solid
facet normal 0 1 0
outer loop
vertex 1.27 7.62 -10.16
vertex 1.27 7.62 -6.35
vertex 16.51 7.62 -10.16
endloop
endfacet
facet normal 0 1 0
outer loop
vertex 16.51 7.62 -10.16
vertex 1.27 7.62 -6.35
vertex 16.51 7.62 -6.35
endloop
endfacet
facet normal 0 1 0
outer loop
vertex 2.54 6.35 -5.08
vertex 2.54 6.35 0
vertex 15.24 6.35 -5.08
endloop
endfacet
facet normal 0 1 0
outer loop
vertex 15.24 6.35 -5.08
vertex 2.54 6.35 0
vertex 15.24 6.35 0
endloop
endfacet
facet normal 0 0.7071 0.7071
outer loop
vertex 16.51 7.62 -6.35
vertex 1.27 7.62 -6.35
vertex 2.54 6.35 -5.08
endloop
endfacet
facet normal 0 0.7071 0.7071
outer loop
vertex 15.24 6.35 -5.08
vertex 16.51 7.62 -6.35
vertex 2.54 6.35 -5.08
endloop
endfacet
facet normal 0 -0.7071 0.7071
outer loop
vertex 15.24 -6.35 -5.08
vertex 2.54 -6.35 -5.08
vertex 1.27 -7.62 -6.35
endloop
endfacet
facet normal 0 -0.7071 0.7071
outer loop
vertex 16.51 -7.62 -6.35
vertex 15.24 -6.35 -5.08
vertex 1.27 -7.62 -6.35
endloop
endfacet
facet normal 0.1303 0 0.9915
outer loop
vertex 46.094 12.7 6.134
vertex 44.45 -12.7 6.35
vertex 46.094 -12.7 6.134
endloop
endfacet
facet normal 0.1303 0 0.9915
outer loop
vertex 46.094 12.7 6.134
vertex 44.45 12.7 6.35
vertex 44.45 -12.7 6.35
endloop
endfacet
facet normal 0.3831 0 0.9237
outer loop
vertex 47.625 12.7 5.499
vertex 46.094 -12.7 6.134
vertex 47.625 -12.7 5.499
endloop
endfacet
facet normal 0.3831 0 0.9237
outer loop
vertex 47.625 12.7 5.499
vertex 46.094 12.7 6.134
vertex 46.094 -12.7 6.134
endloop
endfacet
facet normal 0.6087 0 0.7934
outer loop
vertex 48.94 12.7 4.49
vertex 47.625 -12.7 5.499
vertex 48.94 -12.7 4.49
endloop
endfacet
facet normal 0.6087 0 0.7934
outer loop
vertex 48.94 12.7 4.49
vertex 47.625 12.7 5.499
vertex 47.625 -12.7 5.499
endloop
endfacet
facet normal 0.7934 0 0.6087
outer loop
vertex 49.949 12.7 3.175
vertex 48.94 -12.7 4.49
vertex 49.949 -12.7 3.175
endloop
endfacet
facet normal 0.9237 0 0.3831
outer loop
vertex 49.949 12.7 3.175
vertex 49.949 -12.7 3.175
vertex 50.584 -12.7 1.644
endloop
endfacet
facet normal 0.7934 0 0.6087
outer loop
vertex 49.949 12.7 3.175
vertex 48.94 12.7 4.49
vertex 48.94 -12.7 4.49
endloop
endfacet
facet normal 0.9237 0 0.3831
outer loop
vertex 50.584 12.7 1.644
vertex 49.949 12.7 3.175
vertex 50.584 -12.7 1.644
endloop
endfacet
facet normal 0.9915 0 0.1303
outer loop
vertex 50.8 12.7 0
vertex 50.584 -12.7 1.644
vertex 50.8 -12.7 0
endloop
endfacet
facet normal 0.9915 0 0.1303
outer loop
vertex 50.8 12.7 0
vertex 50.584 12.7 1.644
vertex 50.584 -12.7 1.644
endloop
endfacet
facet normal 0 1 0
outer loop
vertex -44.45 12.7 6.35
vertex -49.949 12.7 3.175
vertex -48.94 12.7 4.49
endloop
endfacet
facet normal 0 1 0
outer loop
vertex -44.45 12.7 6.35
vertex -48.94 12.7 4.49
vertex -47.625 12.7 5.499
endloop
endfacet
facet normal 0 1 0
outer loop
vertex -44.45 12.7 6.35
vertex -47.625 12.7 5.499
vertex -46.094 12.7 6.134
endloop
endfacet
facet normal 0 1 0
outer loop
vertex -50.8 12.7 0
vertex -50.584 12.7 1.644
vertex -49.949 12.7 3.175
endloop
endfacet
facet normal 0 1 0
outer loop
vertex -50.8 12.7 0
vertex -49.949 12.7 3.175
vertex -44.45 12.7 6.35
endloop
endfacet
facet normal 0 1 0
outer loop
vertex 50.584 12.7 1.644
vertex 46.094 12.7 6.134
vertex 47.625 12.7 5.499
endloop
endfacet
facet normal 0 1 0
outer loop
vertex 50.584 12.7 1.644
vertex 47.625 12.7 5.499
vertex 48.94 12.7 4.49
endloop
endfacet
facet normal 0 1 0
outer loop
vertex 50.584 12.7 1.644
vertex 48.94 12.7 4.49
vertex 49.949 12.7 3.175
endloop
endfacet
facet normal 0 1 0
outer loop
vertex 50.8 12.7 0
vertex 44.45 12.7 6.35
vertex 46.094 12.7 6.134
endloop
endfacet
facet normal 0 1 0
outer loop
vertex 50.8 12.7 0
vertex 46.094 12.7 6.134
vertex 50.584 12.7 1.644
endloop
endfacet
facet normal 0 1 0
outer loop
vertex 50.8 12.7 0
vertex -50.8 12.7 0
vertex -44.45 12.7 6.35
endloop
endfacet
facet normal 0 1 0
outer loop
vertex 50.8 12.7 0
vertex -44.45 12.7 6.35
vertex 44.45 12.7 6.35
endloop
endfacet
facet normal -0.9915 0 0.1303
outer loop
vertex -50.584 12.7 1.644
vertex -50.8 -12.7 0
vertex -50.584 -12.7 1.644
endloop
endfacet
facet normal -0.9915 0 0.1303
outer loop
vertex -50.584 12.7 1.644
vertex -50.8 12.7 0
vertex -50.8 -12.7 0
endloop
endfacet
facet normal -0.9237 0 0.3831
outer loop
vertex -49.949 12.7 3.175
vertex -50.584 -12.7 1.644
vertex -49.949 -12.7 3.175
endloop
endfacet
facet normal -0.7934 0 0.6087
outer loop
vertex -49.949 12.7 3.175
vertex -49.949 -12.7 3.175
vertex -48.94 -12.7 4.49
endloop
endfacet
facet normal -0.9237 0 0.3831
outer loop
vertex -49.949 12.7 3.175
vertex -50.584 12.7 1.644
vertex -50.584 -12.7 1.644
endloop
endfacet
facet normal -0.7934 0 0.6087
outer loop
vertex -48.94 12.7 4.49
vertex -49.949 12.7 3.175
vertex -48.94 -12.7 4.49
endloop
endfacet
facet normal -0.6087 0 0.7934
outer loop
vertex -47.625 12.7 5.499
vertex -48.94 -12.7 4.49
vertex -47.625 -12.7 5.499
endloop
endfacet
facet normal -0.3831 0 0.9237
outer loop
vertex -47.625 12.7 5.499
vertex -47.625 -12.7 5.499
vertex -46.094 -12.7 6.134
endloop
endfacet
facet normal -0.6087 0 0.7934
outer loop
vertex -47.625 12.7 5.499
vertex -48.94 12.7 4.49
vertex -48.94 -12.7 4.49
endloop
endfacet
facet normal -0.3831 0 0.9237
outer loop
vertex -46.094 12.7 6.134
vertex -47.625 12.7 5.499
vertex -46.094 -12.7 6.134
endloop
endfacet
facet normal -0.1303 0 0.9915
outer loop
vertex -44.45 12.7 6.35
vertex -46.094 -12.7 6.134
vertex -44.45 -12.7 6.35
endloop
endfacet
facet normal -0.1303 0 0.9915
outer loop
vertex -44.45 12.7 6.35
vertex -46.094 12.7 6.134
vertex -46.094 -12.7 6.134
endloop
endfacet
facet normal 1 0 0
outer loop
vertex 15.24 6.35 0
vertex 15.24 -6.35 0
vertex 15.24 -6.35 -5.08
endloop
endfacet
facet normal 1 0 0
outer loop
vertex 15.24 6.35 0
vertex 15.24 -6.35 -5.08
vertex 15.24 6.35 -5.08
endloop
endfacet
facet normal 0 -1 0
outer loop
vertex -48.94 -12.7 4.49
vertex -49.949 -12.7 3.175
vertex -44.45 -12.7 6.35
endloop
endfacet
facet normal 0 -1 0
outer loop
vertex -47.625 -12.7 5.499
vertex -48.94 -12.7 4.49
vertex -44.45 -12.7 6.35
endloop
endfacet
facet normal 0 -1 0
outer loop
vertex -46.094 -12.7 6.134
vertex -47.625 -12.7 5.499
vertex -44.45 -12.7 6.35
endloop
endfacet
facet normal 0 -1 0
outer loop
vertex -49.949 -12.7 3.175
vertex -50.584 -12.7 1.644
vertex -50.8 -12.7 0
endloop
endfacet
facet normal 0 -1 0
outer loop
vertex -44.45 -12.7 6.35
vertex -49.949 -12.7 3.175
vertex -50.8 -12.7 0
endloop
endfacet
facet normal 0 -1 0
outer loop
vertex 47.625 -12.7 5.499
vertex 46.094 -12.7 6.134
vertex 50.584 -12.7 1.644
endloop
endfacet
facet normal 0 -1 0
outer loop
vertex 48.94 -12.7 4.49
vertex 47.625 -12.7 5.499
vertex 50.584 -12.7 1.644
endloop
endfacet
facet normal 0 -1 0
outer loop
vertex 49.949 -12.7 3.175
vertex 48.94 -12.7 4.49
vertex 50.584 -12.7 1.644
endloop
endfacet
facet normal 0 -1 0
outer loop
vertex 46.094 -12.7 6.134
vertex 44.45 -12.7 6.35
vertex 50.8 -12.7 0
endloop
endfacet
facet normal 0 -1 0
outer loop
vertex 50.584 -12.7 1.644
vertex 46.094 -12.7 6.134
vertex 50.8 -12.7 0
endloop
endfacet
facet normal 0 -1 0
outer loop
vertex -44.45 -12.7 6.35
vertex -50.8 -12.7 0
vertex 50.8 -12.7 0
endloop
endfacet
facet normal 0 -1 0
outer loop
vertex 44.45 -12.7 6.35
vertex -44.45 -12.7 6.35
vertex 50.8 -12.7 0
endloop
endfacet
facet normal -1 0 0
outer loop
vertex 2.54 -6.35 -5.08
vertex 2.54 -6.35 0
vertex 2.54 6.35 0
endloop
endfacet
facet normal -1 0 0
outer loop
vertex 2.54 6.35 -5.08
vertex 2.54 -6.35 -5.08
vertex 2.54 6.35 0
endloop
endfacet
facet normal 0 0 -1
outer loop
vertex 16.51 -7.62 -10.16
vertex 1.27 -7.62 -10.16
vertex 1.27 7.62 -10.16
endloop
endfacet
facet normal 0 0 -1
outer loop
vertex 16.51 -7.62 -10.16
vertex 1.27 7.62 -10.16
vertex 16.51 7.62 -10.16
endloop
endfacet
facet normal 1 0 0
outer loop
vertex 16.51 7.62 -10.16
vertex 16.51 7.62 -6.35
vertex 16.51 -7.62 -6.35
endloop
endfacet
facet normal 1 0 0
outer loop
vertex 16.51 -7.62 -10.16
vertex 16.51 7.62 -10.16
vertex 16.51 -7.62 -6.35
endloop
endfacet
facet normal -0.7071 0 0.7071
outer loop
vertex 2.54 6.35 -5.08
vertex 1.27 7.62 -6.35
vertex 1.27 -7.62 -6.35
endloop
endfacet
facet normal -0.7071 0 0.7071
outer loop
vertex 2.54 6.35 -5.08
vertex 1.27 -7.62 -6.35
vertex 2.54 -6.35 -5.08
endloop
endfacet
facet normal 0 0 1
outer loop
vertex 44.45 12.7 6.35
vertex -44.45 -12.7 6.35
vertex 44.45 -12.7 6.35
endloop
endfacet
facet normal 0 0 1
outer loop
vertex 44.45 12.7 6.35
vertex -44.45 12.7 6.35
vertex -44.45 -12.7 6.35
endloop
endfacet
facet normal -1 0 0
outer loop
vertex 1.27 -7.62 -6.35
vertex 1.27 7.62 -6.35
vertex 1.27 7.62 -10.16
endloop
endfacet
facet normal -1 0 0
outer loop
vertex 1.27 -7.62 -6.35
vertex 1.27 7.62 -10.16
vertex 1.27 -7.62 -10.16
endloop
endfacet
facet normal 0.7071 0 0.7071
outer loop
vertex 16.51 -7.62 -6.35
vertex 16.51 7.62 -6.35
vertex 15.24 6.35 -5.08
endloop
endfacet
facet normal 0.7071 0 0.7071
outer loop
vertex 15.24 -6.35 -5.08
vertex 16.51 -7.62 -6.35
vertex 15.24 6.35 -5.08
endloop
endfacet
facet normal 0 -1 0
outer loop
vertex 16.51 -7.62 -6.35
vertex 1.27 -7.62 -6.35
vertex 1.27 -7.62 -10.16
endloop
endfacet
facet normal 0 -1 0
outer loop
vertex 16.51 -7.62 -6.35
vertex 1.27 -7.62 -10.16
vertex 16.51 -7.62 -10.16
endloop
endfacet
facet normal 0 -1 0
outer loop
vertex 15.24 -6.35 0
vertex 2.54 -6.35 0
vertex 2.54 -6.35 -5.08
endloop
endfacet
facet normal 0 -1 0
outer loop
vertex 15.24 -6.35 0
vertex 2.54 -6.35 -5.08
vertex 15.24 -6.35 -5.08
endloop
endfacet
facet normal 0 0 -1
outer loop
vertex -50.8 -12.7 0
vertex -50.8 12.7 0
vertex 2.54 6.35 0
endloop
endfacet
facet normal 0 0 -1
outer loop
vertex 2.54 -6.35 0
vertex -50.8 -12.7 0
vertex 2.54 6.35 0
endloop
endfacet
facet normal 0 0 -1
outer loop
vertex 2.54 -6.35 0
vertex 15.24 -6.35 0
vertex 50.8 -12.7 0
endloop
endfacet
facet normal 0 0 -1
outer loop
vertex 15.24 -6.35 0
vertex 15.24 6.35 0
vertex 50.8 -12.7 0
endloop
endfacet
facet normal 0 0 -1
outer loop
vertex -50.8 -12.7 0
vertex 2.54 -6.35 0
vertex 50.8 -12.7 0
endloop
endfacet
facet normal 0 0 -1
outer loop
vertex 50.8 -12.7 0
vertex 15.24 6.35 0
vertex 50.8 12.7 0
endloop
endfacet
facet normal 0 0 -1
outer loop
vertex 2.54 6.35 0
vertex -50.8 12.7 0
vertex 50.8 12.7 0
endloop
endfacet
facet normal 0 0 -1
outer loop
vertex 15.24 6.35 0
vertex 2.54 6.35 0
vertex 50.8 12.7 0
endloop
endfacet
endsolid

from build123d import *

# Parameters (mm, degrees)
F0_W          = 101.6
F0_H          = 25.4
F0_W_2        = 12.7
F0_H_2        = 12.7
F1_DEPTH      = 6.35
F2_R          = 6.34999
F3_R          = 6.34999
F4_DEPTH      = 3.81
F5_W          = 15.24
F5_H          = 15.24
F5_W_2        = 12.7
F5_H_2        = 12.7
F6_DEPTH      = 6.35
F7_T4_DEPTH   = 28.3041495789
F7_T10_DEPTH  = 28.3041495789
F7_T16_DEPTH  = 28.3041495789
F7_T23_DEPTH  = 28.3041495789
F7_T29_DEPTH  = 28.3041495789
F7_T35_DEPTH  = 28.3041495789
F7_T41_DEPTH  = 28.3041495789
F7_T47_DEPTH  = 28.3041495789
F7_T54_DEPTH  = 28.3041495789
F7_T60_DEPTH  = 28.3041495789
F7_T66_DEPTH  = 28.3041495789
F7_T72_DEPTH  = 28.3041495789
F7_T78_DEPTH  = 28.3041495789
F7_T85_DEPTH  = 28.3041495789
F7_T91_DEPTH  = 28.3041495789
F7_T97_DEPTH  = 28.3041495789
F7_T103_DEPTH = 28.3041495789
F7_T109_DEPTH = 28.3041495789
F7_T116_DEPTH = 28.3041495789
F7_T122_DEPTH = 28.3041495789


# Not quite as in the source:
# - a fillet or chamfer that OpenCascade refuses, or shapes differently, is made with other operations: its cross-section is extruded or revolved along the edge and cut away or added
# - a fillet or chamfer is up to 0.001 mm smaller than in the source, because OpenCascade refuses the exact size


with BuildPart() as f1:
    # F0 (on Top) → F1 (new body)
    with BuildSketch(Plane.XY):
        Rectangle(F0_W, F0_H)
        with Locations((8.89, 0)):
            Rectangle(F0_W_2, F0_H_2, mode=Mode.SUBTRACT)
        with Locations((8.89, 0)):
            Rectangle(F0_W_2, F0_H_2)
    extrude(amount=F1_DEPTH)

    # F2 (radius 6.35 in the source; OpenCascade refuses exactly that, so slightly less here)
    f2_edges = [f1.edges().sort_by_distance(p)[0] for p in [
        (-50.8, 0, 6.35),
    ]]
    fillet(f2_edges, radius=F2_R)

    # F3 (radius 6.35 in the source; OpenCascade refuses exactly that, so slightly less here)
    f3_edges = [f1.edges().sort_by_distance(p)[0] for p in [
        (50.8, 0, 6.35),
    ]]
    fillet(f3_edges, radius=F3_R)

    # F0 (on Top) → F4 (join)
    with BuildSketch(Plane.XY):
        with Locations((8.89, 0)):
            Rectangle(F0_W_2, F0_H_2)
    extrude(amount=-F4_DEPTH)

    # F5 (on face) → F6 (join)
    with BuildSketch(Plane(origin=(0, 0, -3.81), x_dir=(1, 0, 0), z_dir=(0, 0, -1))):
        with Locations((8.89, 0)):
            Rectangle(F5_W, F5_H)
        with Locations((8.89, 0)):
            Rectangle(F5_W_2, F5_H_2, mode=Mode.SUBTRACT)
        with Locations((8.89, 0)):
            Rectangle(F5_W_2, F5_H_2)
    extrude(amount=F6_DEPTH)

    # F7: chamfer of 2.54 on 4 edges, made by hand


with BuildPart() as f7_tool2:
    # F7_s3 → F7_t4 (new body)
    with BuildSketch(Plane.XZ.offset(14.1520747894)):
        Polygon((1.27, -6.35), (3.81, -3.81), (1.27, -3.81), align=None)
    extrude(amount=-F7_T4_DEPTH)

    split(bisect_by=Plane.XZ.offset(6.35), keep=Keep.TOP)

    split(bisect_by=Plane.YZ.offset(2.54), keep=Keep.BOTTOM)


with BuildPart() as f1_1:
    add(f1.part)

    # F7_t1: cut F7_tool2
    add(f7_tool2.part, mode=Mode.SUBTRACT)


with BuildPart() as f7_tool8:
    # F7_s9 → F7_t10 (new body)
    with BuildSketch(Plane.XZ.offset(14.1520747894)):
        Polygon((1.27, -6.35), (3.81, -3.81), (1.27, -3.81), align=None)
    extrude(amount=-F7_T10_DEPTH)

    split(bisect_by=Plane.XZ.offset(6.35), keep=Keep.TOP)

    split(bisect_by=Plane.YZ.offset(2.54), keep=Keep.TOP)


with BuildPart() as f1_2:
    add(f1_1.part)

    # F7_t7: cut F7_tool8
    add(f7_tool8.part, mode=Mode.SUBTRACT)


with BuildPart() as f7_tool14:
    # F7_s15 → F7_t16 (new body)
    with BuildSketch(Plane.XZ.offset(14.1520747894)):
        Polygon((1.27, -6.35), (3.81, -3.81), (1.27, -3.81), align=None)
    extrude(amount=-F7_T16_DEPTH)

    split(bisect_by=Plane.XZ.offset(6.35), keep=Keep.BOTTOM)

    split(bisect_by=Plane.YZ.offset(2.54), keep=Keep.BOTTOM)

    split(bisect_by=Plane.XZ.offset(-6.35), keep=Keep.TOP)


with BuildPart() as f1_3:
    add(f1_2.part)

    # F7_t13: cut F7_tool14
    add(f7_tool14.part, mode=Mode.SUBTRACT)


with BuildPart() as f7_tool21:
    # F7_s22 → F7_t23 (new body)
    with BuildSketch(Plane.XZ.offset(14.1520747894)):
        Polygon((1.27, -6.35), (3.81, -3.81), (1.27, -3.81), align=None)
    extrude(amount=-F7_T23_DEPTH)

    split(bisect_by=Plane.YZ.offset(2.54), keep=Keep.BOTTOM)

    split(bisect_by=Plane.XZ.offset(-6.35), keep=Keep.BOTTOM)


with BuildPart() as f1_4:
    add(f1_3.part)

    # F7_t20: cut F7_tool21
    add(f7_tool21.part, mode=Mode.SUBTRACT)


with BuildPart() as f7_tool27:
    # F7_s28 → F7_t29 (new body)
    with BuildSketch(Plane.XZ.offset(14.1520747894)):
        Polygon((1.27, -6.35), (3.81, -3.81), (1.27, -3.81), align=None)
    extrude(amount=-F7_T29_DEPTH)

    split(bisect_by=Plane.YZ.offset(2.54), keep=Keep.TOP)

    split(bisect_by=Plane.XZ.offset(-6.35), keep=Keep.BOTTOM)


with BuildPart() as f1_5:
    add(f1_4.part)

    # F7_t26: cut F7_tool27
    add(f7_tool27.part, mode=Mode.SUBTRACT)


with BuildPart() as f7_tool33:
    # F7_s34 → F7_t35 (new body)
    with BuildSketch(Plane.YZ.offset(23.0420747894)):
        Polygon((-5.08, -3.81), (-7.62, -6.35), (-7.62, -3.81), align=None)
    extrude(amount=-F7_T35_DEPTH)

    split(bisect_by=Plane.YZ.offset(15.24), keep=Keep.TOP)

    split(bisect_by=Plane.XZ.offset(6.35), keep=Keep.BOTTOM)


with BuildPart() as f1_6:
    add(f1_5.part)

    # F7_t32: cut F7_tool33
    add(f7_tool33.part, mode=Mode.SUBTRACT)


with BuildPart() as f7_tool39:
    # F7_s40 → F7_t41 (new body)
    with BuildSketch(Plane.YZ.offset(23.0420747894)):
        Polygon((-5.08, -3.81), (-7.62, -6.35), (-7.62, -3.81), align=None)
    extrude(amount=-F7_T41_DEPTH)

    split(bisect_by=Plane.YZ.offset(15.24), keep=Keep.TOP)

    split(bisect_by=Plane.XZ.offset(6.35), keep=Keep.TOP)


with BuildPart() as f1_7:
    add(f1_6.part)

    # F7_t38: cut F7_tool39
    add(f7_tool39.part, mode=Mode.SUBTRACT)


with BuildPart() as f7_tool45:
    # F7_s46 → F7_t47 (new body)
    with BuildSketch(Plane.YZ.offset(23.0420747894)):
        Polygon((-5.08, -3.81), (-7.62, -6.35), (-7.62, -3.81), align=None)
    extrude(amount=-F7_T47_DEPTH)

    split(bisect_by=Plane.YZ.offset(15.24), keep=Keep.BOTTOM)

    split(bisect_by=Plane.XZ.offset(6.35), keep=Keep.TOP)

    split(bisect_by=Plane.YZ.offset(2.54), keep=Keep.TOP)


with BuildPart() as f1_8:
    add(f1_7.part)

    # F7_t44: cut F7_tool45
    add(f7_tool45.part, mode=Mode.SUBTRACT)


with BuildPart() as f7_tool52:
    # F7_s53 → F7_t54 (new body)
    with BuildSketch(Plane.YZ.offset(23.0420747894)):
        Polygon((-5.08, -3.81), (-7.62, -6.35), (-7.62, -3.81), align=None)
    extrude(amount=-F7_T54_DEPTH)

    split(bisect_by=Plane.XZ.offset(6.35), keep=Keep.BOTTOM)

    split(bisect_by=Plane.YZ.offset(2.54), keep=Keep.BOTTOM)


with BuildPart() as f1_9:
    add(f1_8.part)

    # F7_t51: cut F7_tool52
    add(f7_tool52.part, mode=Mode.SUBTRACT)


with BuildPart() as f7_tool58:
    # F7_s59 → F7_t60 (new body)
    with BuildSketch(Plane.YZ.offset(23.0420747894)):
        Polygon((-5.08, -3.81), (-7.62, -6.35), (-7.62, -3.81), align=None)
    extrude(amount=-F7_T60_DEPTH)

    split(bisect_by=Plane.XZ.offset(6.35), keep=Keep.TOP)

    split(bisect_by=Plane.YZ.offset(2.54), keep=Keep.BOTTOM)


with BuildPart() as f1_10:
    add(f1_9.part)

    # F7_t57: cut F7_tool58
    add(f7_tool58.part, mode=Mode.SUBTRACT)


with BuildPart() as f7_tool64:
    # F7_s65 → F7_t66 (new body)
    with BuildSketch(Plane.XZ.offset(-14.1520747894)):
        Polygon((16.51, -6.35), (13.97, -3.81), (16.51, -3.81), align=None)
    extrude(amount=F7_T66_DEPTH)

    split(bisect_by=Plane.YZ.offset(15.24), keep=Keep.TOP)

    split(bisect_by=Plane.XZ.offset(-6.35), keep=Keep.BOTTOM)


with BuildPart() as f1_11:
    add(f1_10.part)

    # F7_t63: cut F7_tool64
    add(f7_tool64.part, mode=Mode.SUBTRACT)


with BuildPart() as f7_tool70:
    # F7_s71 → F7_t72 (new body)
    with BuildSketch(Plane.XZ.offset(-14.1520747894)):
        Polygon((16.51, -6.35), (13.97, -3.81), (16.51, -3.81), align=None)
    extrude(amount=F7_T72_DEPTH)

    split(bisect_by=Plane.YZ.offset(15.24), keep=Keep.BOTTOM)

    split(bisect_by=Plane.XZ.offset(-6.35), keep=Keep.BOTTOM)


with BuildPart() as f1_12:
    add(f1_11.part)

    # F7_t69: cut F7_tool70
    add(f7_tool70.part, mode=Mode.SUBTRACT)


with BuildPart() as f7_tool76:
    # F7_s77 → F7_t78 (new body)
    with BuildSketch(Plane.XZ.offset(-14.1520747894)):
        Polygon((16.51, -6.35), (13.97, -3.81), (16.51, -3.81), align=None)
    extrude(amount=F7_T78_DEPTH)

    split(bisect_by=Plane.YZ.offset(15.24), keep=Keep.TOP)

    split(bisect_by=Plane.XZ.offset(6.35), keep=Keep.BOTTOM)

    split(bisect_by=Plane.XZ.offset(-6.35), keep=Keep.TOP)


with BuildPart() as f1_13:
    add(f1_12.part)

    # F7_t75: cut F7_tool76
    add(f7_tool76.part, mode=Mode.SUBTRACT)


with BuildPart() as f7_tool83:
    # F7_s84 → F7_t85 (new body)
    with BuildSketch(Plane.XZ.offset(-14.1520747894)):
        Polygon((16.51, -6.35), (13.97, -3.81), (16.51, -3.81), align=None)
    extrude(amount=F7_T85_DEPTH)

    split(bisect_by=Plane.YZ.offset(15.24), keep=Keep.TOP)

    split(bisect_by=Plane.XZ.offset(6.35), keep=Keep.TOP)


with BuildPart() as f1_14:
    add(f1_13.part)

    # F7_t82: cut F7_tool83
    add(f7_tool83.part, mode=Mode.SUBTRACT)


with BuildPart() as f7_tool89:
    # F7_s90 → F7_t91 (new body)
    with BuildSketch(Plane.XZ.offset(-14.1520747894)):
        Polygon((16.51, -6.35), (13.97, -3.81), (16.51, -3.81), align=None)
    extrude(amount=F7_T91_DEPTH)

    split(bisect_by=Plane.YZ.offset(15.24), keep=Keep.BOTTOM)

    split(bisect_by=Plane.XZ.offset(6.35), keep=Keep.TOP)


with BuildPart() as f1_15:
    add(f1_14.part)

    # F7_t88: cut F7_tool89
    add(f7_tool89.part, mode=Mode.SUBTRACT)


with BuildPart() as f7_tool95:
    # F7_s96 → F7_t97 (new body)
    with BuildSketch(Plane.YZ.offset(-5.2620747894)):
        Polygon((7.62, -6.35), (5.08, -3.81), (7.62, -3.81), align=None)
    extrude(amount=F7_T97_DEPTH)

    split(bisect_by=Plane.YZ.offset(2.54), keep=Keep.BOTTOM)

    split(bisect_by=Plane.XZ.offset(-6.35), keep=Keep.BOTTOM)


with BuildPart() as f1_16:
    add(f1_15.part)

    # F7_t94: cut F7_tool95
    add(f7_tool95.part, mode=Mode.SUBTRACT)


with BuildPart() as f7_tool101:
    # F7_s102 → F7_t103 (new body)
    with BuildSketch(Plane.YZ.offset(-5.2620747894)):
        Polygon((7.62, -6.35), (5.08, -3.81), (7.62, -3.81), align=None)
    extrude(amount=F7_T103_DEPTH)

    split(bisect_by=Plane.YZ.offset(2.54), keep=Keep.BOTTOM)

    split(bisect_by=Plane.XZ.offset(-6.35), keep=Keep.TOP)


with BuildPart() as f1_17:
    add(f1_16.part)

    # F7_t100: cut F7_tool101
    add(f7_tool101.part, mode=Mode.SUBTRACT)


with BuildPart() as f7_tool107:
    # F7_s108 → F7_t109 (new body)
    with BuildSketch(Plane.YZ.offset(-5.2620747894)):
        Polygon((7.62, -6.35), (5.08, -3.81), (7.62, -3.81), align=None)
    extrude(amount=F7_T109_DEPTH)

    split(bisect_by=Plane.YZ.offset(15.24), keep=Keep.BOTTOM)

    split(bisect_by=Plane.YZ.offset(2.54), keep=Keep.TOP)

    split(bisect_by=Plane.XZ.offset(-6.35), keep=Keep.BOTTOM)


with BuildPart() as f1_18:
    add(f1_17.part)

    # F7_t106: cut F7_tool107
    add(f7_tool107.part, mode=Mode.SUBTRACT)


with BuildPart() as f7_tool114:
    # F7_s115 → F7_t116 (new body)
    with BuildSketch(Plane.YZ.offset(-5.2620747894)):
        Polygon((7.62, -6.35), (5.08, -3.81), (7.62, -3.81), align=None)
    extrude(amount=F7_T116_DEPTH)

    split(bisect_by=Plane.YZ.offset(15.24), keep=Keep.TOP)

    split(bisect_by=Plane.XZ.offset(-6.35), keep=Keep.BOTTOM)


with BuildPart() as f1_19:
    add(f1_18.part)

    # F7_t113: cut F7_tool114
    add(f7_tool114.part, mode=Mode.SUBTRACT)


with BuildPart() as f7_tool120:
    # F7_s121 → F7_t122 (new body)
    with BuildSketch(Plane.YZ.offset(-5.2620747894)):
        Polygon((7.62, -6.35), (5.08, -3.81), (7.62, -3.81), align=None)
    extrude(amount=F7_T122_DEPTH)

    split(bisect_by=Plane.YZ.offset(15.24), keep=Keep.TOP)

    split(bisect_by=Plane.XZ.offset(-6.35), keep=Keep.TOP)


with BuildPart() as f1_20:
    add(f1_19.part)

    # F7_t119: cut F7_tool120
    add(f7_tool120.part, mode=Mode.SUBTRACT)


solid = f1_20.part
